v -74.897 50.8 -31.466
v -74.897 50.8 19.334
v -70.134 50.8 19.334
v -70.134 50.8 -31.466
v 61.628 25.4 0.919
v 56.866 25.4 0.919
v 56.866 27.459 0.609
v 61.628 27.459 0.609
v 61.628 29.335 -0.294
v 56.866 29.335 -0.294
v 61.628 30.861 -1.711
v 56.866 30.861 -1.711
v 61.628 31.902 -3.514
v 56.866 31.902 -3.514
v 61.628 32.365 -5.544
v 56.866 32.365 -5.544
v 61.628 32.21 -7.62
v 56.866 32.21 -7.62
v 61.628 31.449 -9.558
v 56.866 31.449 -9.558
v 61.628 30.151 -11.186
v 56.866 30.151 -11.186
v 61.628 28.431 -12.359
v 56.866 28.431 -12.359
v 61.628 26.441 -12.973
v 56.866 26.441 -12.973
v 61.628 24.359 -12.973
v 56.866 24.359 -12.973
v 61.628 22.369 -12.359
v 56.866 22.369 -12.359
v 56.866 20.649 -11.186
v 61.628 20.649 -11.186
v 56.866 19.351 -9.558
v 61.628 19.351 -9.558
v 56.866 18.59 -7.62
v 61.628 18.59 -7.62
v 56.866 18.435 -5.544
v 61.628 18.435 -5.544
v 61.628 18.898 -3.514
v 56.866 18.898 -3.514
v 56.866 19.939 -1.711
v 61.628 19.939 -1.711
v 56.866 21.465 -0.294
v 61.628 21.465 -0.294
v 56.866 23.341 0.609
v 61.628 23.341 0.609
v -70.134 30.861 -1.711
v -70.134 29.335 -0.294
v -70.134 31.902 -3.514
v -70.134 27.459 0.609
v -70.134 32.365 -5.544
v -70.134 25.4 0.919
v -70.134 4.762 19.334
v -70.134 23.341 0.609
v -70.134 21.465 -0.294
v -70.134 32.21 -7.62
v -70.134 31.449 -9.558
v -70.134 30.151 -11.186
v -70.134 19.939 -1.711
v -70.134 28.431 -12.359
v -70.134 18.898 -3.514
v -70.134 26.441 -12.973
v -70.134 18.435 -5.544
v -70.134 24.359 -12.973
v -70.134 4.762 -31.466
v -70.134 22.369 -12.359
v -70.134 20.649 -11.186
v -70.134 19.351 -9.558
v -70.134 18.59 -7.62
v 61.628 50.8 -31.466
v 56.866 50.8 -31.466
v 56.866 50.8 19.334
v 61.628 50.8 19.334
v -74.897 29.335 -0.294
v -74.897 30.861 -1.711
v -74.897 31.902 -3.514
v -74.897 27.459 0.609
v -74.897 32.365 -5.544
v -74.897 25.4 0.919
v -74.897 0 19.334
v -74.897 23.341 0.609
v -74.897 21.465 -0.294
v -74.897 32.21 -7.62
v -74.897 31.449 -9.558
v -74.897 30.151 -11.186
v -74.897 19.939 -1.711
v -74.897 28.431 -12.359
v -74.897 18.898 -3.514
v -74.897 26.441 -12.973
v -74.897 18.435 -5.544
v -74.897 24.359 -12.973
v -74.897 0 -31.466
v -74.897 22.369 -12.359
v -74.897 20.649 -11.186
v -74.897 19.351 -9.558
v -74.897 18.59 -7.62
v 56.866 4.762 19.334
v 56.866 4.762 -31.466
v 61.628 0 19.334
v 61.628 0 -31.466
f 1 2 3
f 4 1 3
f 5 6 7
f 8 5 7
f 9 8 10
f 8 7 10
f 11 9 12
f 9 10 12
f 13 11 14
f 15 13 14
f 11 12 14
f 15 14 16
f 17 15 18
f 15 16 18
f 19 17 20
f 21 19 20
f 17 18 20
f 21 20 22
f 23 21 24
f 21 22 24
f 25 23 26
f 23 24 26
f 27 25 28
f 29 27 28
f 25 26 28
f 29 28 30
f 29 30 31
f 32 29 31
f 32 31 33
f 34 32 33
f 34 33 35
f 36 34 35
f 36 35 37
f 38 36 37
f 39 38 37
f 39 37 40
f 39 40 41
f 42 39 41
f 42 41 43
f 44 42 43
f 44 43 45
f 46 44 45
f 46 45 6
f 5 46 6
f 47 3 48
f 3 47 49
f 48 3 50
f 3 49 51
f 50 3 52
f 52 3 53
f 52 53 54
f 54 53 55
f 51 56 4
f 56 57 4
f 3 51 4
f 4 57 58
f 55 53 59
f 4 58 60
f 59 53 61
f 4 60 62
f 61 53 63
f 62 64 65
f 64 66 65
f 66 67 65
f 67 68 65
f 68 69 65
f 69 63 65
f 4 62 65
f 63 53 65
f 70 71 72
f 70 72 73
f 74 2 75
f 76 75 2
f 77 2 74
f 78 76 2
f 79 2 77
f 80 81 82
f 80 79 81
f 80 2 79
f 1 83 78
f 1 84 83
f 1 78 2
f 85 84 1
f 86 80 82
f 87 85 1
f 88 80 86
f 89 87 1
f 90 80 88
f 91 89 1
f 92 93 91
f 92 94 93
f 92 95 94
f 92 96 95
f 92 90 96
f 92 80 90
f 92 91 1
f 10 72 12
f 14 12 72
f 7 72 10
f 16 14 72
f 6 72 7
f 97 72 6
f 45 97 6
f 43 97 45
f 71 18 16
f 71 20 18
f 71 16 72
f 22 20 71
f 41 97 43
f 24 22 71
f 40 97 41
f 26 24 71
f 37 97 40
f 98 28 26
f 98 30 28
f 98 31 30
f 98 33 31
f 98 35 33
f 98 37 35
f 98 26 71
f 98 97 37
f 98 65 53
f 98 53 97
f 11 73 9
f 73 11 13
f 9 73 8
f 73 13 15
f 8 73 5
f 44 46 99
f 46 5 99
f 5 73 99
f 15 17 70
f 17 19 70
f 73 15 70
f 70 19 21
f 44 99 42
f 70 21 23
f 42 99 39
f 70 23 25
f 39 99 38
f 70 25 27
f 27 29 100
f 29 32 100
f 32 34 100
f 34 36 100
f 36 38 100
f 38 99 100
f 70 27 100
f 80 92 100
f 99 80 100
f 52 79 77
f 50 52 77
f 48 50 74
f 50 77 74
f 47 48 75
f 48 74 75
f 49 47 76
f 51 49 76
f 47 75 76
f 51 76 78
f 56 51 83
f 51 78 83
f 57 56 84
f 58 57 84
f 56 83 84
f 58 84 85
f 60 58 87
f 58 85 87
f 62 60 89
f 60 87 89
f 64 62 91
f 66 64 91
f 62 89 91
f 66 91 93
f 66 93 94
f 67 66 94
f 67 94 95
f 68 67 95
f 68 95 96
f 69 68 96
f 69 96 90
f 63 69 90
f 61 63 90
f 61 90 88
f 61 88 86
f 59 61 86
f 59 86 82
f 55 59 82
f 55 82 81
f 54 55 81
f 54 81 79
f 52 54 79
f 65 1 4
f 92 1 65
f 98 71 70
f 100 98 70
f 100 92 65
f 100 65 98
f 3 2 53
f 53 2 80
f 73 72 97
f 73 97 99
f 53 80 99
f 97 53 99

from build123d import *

# Parameters (mm, degrees)
SKETCH1_W           = 127
SKETCH1_H           = 50.8
BOSS_EXTRUDE2_DEPTH = 4.7625
SKETCH3_W           = 4.7625
SKETCH3_H           = 50.8
BOSS_EXTRUDE3_DEPTH = 50.8
SKETCH4_R           = 6.985
CUT_EXTRUDE1_DEPTH  = 137.525


with BuildPart() as part:
    # Sketch1 → Boss-Extrude2 (new body)
    with BuildSketch(Plane(origin=(0, 0, 0), x_dir=(1, 0, 0), z_dir=(0, 1, 0))):
        with Locations((-6.634328358, 6.065671642)):
            Rectangle(SKETCH1_W, SKETCH1_H)
    extrude(amount=BOSS_EXTRUDE2_DEPTH)

    # Sketch3 → Boss-Extrude3 (add)
    with BuildSketch(Plane(origin=(0, 0, 0), x_dir=(1, 0, 0), z_dir=(0, 1, 0))):
        with Locations((59.246921642, 6.065671642)):
            Rectangle(SKETCH3_W, SKETCH3_H)
        with Locations((-72.515578358, 6.065671642)):
            Rectangle(SKETCH3_W, SKETCH3_H)
    extrude(amount=BOSS_EXTRUDE3_DEPTH)

    # Sketch4 → Cut-Extrude1 (cut, through all)
    with BuildSketch(Plane.ZY.offset(74.896828358)):
        with Locations((-6.065671642, 25.4)):
            Circle(SKETCH4_R)
    extrude(amount=-CUT_EXTRUDE1_DEPTH, mode=Mode.SUBTRACT)


solid = part.part
